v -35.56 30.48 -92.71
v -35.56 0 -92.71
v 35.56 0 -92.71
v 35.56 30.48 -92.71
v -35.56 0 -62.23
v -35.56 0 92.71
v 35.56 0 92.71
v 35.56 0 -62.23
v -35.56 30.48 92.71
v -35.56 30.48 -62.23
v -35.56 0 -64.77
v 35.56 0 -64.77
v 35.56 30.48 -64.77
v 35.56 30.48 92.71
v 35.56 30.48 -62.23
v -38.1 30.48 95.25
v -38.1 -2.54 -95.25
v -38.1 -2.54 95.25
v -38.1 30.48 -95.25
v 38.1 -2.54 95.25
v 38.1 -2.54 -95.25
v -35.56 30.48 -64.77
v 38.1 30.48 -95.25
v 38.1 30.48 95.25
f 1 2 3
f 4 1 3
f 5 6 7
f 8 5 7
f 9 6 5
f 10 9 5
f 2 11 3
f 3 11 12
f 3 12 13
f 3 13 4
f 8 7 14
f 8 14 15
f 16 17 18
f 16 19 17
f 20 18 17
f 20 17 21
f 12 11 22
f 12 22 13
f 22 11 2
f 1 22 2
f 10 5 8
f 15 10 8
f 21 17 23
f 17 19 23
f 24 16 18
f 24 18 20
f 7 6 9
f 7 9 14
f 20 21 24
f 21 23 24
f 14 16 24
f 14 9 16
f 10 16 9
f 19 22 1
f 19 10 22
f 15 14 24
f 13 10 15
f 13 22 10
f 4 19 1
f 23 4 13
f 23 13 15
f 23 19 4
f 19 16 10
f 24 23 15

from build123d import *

# Parameters (mm, degrees)
SKETCH1_W           = 76.2
SKETCH1_H           = 190.5
SKETCH1_W_2         = 71.12
SKETCH1_H_2         = 185.42
EXTRUDE_THIN1_DEPTH = 30.48
SKETCH2_W           = 76.2
SKETCH2_H           = 190.5
BOSS_EXTRUDE1_DEPTH = 2.54
SKETCH4_W           = 71.12
SKETCH4_H           = 2.54
BOSS_EXTRUDE2_DEPTH = 30.48


with BuildPart() as part:
    # Sketch1 → Extrude-Thin1 (new body)
    with BuildSketch(Plane(origin=(0, 0, 0), x_dir=(1, 0, 0), z_dir=(0, 1, 0))):
        Rectangle(SKETCH1_W, SKETCH1_H)
        Rectangle(SKETCH1_W_2, SKETCH1_H_2, mode=Mode.SUBTRACT)
    extrude(amount=EXTRUDE_THIN1_DEPTH)

    # Sketch2 → Boss-Extrude1 (add)
    with BuildSketch(Plane.XZ):
        Rectangle(SKETCH2_W, SKETCH2_H)
    extrude(amount=BOSS_EXTRUDE1_DEPTH)

    # Sketch4 → Boss-Extrude2 (add)
    with BuildSketch(Plane(origin=(0, 0, 0), x_dir=(1, 0, 0), z_dir=(0, 1, 0))):
        with Locations((0, 63.5)):
            Rectangle(SKETCH4_W, SKETCH4_H)
    extrude(amount=BOSS_EXTRUDE2_DEPTH)


solid = part.part
